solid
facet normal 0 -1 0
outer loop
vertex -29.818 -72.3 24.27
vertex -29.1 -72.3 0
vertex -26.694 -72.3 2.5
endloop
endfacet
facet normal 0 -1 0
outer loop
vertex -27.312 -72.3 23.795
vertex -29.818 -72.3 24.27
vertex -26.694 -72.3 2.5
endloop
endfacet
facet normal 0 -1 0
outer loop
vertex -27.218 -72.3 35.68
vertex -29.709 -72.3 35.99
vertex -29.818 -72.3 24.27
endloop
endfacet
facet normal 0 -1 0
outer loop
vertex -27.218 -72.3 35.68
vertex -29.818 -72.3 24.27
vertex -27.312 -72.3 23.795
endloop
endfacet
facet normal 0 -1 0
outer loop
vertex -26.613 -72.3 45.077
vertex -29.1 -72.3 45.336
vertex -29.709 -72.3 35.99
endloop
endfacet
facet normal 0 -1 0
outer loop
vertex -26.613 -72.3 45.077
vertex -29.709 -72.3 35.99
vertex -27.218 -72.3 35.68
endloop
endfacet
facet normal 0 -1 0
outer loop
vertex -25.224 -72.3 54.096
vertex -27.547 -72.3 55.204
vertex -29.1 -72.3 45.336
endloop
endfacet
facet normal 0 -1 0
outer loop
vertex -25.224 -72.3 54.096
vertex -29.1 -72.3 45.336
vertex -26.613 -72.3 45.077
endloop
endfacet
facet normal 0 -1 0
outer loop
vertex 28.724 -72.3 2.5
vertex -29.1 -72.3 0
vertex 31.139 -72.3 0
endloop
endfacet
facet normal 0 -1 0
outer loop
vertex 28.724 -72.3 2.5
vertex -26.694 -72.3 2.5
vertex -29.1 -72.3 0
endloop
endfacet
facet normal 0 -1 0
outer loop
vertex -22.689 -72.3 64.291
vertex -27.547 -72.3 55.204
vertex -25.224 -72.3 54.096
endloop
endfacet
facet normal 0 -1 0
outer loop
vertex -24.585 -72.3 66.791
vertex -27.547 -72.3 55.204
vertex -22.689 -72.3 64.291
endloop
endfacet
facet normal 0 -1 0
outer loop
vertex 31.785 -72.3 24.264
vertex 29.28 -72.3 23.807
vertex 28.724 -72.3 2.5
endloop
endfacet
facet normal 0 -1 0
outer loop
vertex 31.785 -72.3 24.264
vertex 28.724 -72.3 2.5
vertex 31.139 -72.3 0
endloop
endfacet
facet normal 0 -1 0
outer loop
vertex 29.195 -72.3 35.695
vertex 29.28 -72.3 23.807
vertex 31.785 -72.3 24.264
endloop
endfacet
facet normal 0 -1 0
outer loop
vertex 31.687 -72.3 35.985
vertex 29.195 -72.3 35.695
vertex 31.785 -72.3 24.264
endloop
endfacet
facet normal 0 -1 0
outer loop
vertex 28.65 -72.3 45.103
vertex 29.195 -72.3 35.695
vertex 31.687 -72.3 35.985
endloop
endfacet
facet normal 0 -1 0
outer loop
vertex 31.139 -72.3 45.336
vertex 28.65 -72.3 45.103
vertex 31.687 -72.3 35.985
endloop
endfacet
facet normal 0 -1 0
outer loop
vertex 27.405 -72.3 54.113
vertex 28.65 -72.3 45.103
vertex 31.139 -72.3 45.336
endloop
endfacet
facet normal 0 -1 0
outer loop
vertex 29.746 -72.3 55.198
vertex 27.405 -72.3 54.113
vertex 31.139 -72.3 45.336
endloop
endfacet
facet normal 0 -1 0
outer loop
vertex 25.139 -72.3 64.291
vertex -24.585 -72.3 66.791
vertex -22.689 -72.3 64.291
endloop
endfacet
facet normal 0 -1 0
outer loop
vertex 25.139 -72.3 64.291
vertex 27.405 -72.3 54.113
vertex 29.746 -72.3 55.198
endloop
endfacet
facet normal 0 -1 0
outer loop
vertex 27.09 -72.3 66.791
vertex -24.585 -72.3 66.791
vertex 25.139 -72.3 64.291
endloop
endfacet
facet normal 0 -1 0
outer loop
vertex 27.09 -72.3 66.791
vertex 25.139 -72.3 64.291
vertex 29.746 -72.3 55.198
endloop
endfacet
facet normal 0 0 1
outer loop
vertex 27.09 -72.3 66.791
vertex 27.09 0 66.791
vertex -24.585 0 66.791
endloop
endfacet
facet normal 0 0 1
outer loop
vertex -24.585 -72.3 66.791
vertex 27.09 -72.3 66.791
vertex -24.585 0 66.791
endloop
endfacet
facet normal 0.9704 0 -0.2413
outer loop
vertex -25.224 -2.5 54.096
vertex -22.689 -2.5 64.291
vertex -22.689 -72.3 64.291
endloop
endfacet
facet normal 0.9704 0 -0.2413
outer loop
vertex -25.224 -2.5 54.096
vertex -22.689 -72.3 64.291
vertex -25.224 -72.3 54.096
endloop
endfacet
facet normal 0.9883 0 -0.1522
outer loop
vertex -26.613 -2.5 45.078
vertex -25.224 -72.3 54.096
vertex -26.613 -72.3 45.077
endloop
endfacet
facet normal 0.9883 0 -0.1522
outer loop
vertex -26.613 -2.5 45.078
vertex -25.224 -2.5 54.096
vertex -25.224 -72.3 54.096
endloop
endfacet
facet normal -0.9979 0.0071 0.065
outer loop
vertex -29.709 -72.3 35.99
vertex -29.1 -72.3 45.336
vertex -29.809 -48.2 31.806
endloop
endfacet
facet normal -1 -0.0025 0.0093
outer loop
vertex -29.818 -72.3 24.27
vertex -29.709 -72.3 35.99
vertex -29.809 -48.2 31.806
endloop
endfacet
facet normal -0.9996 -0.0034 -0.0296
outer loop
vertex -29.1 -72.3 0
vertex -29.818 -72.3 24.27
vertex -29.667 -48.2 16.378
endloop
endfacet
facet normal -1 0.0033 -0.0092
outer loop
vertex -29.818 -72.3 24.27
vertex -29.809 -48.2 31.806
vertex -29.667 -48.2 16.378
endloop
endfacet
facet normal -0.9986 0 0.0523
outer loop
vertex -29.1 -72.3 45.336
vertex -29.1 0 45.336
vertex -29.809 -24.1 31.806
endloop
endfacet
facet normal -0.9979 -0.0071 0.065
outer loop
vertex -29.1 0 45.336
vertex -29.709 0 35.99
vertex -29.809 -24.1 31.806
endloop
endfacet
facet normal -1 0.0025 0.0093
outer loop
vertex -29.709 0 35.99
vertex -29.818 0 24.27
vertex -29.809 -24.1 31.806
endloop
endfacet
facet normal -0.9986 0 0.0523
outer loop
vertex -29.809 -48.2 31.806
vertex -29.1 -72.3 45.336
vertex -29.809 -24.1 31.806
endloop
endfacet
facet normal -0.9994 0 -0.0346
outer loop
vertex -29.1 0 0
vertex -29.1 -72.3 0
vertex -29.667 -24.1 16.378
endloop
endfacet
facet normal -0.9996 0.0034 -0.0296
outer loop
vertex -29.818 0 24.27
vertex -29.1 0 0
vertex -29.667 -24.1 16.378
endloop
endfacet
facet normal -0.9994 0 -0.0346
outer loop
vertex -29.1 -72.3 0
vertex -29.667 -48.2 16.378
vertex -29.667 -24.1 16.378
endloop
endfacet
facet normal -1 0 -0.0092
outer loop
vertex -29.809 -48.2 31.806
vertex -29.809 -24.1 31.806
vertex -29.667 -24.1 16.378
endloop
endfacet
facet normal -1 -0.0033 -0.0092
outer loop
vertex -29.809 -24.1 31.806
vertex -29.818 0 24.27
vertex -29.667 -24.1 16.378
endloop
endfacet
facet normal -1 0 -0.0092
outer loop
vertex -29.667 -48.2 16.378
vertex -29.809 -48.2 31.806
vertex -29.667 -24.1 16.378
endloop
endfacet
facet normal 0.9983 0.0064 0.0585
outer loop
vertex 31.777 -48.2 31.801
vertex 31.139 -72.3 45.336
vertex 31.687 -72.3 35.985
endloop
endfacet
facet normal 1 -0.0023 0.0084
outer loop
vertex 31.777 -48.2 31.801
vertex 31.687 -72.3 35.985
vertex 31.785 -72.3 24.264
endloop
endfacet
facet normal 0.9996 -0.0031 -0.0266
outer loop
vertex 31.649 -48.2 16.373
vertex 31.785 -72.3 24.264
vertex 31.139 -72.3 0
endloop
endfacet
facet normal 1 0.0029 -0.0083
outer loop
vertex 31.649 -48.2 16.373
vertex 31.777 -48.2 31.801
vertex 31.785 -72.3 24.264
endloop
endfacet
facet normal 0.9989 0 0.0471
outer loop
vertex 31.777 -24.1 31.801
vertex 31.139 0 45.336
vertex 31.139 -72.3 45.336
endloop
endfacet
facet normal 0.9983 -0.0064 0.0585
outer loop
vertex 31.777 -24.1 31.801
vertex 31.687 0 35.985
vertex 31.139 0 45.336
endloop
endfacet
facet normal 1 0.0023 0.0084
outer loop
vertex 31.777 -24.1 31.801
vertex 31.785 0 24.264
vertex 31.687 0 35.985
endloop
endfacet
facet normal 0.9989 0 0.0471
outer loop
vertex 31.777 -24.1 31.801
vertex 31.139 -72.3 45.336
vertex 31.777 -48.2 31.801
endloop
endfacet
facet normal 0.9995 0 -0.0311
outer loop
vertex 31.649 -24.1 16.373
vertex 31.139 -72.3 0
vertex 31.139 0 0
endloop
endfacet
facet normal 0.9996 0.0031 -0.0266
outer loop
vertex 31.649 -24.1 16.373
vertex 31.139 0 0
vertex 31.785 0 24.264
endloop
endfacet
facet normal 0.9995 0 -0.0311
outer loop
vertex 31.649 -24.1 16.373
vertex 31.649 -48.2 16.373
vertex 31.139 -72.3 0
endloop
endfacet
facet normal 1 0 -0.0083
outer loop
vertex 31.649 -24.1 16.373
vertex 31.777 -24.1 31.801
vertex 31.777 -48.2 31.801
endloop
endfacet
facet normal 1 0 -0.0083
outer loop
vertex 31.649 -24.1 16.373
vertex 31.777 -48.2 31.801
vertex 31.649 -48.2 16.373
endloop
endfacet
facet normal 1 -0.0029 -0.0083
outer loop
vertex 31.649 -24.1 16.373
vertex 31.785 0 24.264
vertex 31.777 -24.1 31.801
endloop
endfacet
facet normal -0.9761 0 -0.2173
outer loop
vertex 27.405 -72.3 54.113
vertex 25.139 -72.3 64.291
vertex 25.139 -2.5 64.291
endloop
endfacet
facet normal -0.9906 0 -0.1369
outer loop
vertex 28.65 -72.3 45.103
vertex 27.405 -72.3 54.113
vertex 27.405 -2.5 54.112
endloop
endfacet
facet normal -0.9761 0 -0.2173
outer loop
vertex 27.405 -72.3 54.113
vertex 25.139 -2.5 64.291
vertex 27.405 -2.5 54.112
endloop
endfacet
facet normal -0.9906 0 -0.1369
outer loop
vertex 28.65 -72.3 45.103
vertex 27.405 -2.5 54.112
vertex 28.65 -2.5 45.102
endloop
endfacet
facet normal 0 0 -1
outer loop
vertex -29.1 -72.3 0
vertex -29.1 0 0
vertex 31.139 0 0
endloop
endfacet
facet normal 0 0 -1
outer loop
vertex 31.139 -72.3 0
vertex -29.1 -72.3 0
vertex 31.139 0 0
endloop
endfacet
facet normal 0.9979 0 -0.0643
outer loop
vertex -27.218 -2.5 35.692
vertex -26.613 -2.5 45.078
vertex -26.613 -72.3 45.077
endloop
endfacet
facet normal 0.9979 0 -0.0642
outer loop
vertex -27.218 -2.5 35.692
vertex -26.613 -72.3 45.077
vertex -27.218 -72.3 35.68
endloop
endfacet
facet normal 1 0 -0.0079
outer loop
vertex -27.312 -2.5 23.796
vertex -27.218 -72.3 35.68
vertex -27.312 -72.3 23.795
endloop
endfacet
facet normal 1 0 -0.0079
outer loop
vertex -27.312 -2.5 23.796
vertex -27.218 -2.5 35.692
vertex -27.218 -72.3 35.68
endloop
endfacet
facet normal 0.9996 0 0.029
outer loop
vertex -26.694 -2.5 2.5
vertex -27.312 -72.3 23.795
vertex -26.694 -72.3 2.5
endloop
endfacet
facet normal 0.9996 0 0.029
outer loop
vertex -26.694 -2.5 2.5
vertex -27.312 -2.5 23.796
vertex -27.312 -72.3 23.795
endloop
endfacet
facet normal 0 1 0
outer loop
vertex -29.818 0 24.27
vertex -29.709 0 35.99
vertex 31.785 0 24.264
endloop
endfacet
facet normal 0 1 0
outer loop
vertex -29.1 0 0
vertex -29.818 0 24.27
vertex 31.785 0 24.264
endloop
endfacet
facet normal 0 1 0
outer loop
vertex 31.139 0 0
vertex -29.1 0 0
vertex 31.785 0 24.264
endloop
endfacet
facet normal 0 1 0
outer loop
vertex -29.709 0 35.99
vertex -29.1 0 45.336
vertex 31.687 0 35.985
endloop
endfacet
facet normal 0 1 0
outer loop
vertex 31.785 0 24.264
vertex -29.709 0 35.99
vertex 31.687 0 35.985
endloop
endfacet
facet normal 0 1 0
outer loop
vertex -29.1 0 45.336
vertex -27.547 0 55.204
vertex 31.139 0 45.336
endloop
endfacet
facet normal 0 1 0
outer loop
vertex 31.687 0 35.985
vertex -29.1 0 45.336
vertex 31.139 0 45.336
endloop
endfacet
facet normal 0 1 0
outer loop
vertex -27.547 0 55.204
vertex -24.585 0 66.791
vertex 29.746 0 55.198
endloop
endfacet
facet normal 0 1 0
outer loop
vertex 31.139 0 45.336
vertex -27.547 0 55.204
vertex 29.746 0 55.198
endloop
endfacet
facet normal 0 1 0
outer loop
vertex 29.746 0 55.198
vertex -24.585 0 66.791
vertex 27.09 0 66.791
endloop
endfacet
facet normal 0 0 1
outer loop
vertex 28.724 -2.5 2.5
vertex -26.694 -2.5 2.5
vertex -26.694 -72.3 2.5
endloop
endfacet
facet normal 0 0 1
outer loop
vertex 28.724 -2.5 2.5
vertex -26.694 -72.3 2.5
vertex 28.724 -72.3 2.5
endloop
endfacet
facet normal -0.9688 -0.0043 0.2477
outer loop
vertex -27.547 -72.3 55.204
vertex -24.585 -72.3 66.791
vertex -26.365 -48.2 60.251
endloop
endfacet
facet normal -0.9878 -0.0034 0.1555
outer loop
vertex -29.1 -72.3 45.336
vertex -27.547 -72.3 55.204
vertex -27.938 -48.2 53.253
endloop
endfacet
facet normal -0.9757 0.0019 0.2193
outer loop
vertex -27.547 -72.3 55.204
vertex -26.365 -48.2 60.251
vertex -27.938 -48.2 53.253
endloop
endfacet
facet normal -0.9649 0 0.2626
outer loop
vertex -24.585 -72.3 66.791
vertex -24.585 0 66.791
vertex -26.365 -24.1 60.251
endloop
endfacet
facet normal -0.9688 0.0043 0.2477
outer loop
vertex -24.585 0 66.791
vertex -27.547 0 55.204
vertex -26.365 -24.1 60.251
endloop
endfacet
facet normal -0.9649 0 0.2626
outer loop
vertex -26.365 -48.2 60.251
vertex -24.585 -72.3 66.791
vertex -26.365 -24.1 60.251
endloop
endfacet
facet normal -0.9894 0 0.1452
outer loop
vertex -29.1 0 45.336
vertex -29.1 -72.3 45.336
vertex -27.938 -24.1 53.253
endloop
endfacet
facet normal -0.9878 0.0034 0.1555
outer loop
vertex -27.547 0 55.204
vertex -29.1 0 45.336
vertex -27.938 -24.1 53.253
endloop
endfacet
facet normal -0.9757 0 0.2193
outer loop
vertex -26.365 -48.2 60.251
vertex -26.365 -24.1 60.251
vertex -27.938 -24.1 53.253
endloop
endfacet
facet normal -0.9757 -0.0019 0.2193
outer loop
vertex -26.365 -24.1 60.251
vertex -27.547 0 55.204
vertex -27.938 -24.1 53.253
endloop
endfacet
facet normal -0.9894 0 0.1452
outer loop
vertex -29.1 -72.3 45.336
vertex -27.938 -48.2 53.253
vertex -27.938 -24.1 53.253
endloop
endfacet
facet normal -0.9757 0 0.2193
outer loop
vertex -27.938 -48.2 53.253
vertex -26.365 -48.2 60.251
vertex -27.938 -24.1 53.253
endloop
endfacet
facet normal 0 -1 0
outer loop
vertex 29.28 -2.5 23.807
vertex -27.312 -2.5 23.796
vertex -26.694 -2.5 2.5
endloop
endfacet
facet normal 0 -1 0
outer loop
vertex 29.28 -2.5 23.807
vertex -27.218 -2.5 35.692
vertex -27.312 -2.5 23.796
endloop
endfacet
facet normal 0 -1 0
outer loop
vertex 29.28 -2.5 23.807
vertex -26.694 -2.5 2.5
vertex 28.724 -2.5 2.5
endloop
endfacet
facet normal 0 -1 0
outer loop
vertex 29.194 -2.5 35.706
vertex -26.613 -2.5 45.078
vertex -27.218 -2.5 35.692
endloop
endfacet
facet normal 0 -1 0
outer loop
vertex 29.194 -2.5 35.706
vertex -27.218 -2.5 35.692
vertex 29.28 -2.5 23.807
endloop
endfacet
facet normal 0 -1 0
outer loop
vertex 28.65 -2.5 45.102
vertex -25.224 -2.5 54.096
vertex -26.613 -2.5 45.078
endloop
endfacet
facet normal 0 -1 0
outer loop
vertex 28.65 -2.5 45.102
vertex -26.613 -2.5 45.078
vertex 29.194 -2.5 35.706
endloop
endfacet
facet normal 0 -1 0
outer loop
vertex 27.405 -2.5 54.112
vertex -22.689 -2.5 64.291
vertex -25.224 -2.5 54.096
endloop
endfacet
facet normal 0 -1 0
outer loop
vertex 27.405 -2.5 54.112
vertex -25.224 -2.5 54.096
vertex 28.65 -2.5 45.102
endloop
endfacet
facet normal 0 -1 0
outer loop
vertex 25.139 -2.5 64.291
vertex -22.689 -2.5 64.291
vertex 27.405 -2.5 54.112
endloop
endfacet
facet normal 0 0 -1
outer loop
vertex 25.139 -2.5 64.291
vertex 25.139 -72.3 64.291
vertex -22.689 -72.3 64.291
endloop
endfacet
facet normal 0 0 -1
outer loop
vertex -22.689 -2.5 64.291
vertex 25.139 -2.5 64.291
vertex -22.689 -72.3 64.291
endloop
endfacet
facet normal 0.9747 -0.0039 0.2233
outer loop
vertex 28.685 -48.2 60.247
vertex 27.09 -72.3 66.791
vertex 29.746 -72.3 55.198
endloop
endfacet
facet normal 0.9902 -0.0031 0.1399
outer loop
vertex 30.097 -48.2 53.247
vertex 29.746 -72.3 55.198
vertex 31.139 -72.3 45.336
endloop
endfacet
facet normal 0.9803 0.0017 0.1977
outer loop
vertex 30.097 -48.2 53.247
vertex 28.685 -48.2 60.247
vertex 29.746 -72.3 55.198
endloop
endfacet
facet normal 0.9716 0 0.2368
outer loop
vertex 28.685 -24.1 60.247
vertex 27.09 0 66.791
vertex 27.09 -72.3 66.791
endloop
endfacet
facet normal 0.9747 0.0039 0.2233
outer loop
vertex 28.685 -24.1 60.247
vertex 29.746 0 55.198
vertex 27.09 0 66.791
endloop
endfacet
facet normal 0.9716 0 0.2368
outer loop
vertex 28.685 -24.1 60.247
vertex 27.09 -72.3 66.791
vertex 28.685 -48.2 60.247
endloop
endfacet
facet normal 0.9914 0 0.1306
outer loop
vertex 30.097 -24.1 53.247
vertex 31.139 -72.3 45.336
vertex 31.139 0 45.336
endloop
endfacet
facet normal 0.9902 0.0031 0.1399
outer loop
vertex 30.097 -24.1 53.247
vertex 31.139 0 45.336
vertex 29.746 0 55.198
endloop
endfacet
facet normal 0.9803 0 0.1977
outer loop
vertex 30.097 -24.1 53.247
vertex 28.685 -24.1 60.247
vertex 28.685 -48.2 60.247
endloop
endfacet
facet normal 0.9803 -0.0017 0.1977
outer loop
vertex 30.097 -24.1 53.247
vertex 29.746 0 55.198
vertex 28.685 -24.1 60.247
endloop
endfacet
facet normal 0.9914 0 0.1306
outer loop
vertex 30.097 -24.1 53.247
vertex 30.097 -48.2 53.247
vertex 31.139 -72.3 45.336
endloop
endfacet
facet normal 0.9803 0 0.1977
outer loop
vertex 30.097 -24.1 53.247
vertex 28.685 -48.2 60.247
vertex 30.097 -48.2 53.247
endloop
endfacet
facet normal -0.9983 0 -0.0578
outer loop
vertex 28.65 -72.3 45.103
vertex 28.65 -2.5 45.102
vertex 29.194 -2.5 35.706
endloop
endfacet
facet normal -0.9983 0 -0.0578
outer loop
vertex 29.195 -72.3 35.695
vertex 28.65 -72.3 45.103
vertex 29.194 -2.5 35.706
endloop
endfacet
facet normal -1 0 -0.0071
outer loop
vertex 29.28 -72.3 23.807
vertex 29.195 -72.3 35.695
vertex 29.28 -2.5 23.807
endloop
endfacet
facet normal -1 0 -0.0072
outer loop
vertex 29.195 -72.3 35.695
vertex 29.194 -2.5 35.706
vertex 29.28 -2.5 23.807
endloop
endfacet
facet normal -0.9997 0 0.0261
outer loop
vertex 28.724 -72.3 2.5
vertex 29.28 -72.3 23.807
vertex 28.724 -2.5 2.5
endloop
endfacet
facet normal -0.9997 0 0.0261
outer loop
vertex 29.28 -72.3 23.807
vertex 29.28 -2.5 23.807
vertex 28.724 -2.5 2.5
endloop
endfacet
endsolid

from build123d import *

# Parameters (mm, degrees)
F0_W     = 60.2390449494
F0_H     = 45.3361533582
F1_DEPTH = 72.3
F2_T     = -2.5


with BuildPart() as f1:
    # F0 (on Front) → F1 (new body)
    with BuildSketch(Plane.XZ):
        with BuildLine():
            add(Edge.make_bspline(
                [(-29.0998518467, 45.3361533582), (-30.3761818728, 33.0718928085), (-29.7380168597, 16.5359464043), (-29.0998518467, 0)],
                knots=[0.4101722166, 0.4101722166, 0.4101722166, 0.4101722166, 1, 1, 1, 1], degree=3))
            Line((-29.0998518467, 0), (-29.0998518467, 45.3361533582))
        make_face()
        with BuildLine():
            Line((31.1391931027, 45.3361533582), (31.1391931027, 0))
            add(Edge.make_bspline(
                [(31.1391931027, 45.3361533582), (32.2873652792, 33.0616785906), (31.713279191, 16.5308392953), (31.1391931027, 0)],
                knots=[0.4096689576, 0.4096689576, 0.4096689576, 0.4096689576, 1, 1, 1, 1], degree=3))
        make_face()
        with Locations((1.019670628, 22.6680766791)):
            Rectangle(F0_W, F0_H)
        with BuildLine():
            add(Edge.make_bspline(
                [(-24.5854519308, 66.7906925082), (-26.3988654728, 60.3277684568), (-28.2122790148, 53.8648444053), (-29.0998518467, 45.3361533582)],
                knots=[0, 0, 0, 0, 0.4101722166, 0.4101722166, 0.4101722166, 0.4101722166], degree=3))
            Line((-29.0998518467, 45.3361533582), (31.1391931027, 45.3361533582))
            add(Edge.make_bspline(
                [(27.0899850875, 66.7906925082), (28.7161935637, 60.3224495827), (30.3424020399, 53.8542066572), (31.1391931027, 45.3361533582)],
                knots=[0, 0, 0, 0, 0.4096689576, 0.4096689576, 0.4096689576, 0.4096689576], degree=3))
            Line((27.0899850875, 66.7906925082), (0, 66.7906925082))
            Line((0, 66.7906925082), (-21.6005891562, 66.7906925082))
            Line((-21.6005891562, 66.7906925082), (-24.5854519308, 66.7906925082))
        make_face()
    extrude(amount=F1_DEPTH)

    # F2
    f2_openings = [f1.faces().sort_by_distance(p)[0] for p in [
        (1.031904, -72.3, 32.779225),
    ]]
    offset(amount=F2_T, openings=f2_openings, kind=Kind.INTERSECTION)


solid = f1.part
